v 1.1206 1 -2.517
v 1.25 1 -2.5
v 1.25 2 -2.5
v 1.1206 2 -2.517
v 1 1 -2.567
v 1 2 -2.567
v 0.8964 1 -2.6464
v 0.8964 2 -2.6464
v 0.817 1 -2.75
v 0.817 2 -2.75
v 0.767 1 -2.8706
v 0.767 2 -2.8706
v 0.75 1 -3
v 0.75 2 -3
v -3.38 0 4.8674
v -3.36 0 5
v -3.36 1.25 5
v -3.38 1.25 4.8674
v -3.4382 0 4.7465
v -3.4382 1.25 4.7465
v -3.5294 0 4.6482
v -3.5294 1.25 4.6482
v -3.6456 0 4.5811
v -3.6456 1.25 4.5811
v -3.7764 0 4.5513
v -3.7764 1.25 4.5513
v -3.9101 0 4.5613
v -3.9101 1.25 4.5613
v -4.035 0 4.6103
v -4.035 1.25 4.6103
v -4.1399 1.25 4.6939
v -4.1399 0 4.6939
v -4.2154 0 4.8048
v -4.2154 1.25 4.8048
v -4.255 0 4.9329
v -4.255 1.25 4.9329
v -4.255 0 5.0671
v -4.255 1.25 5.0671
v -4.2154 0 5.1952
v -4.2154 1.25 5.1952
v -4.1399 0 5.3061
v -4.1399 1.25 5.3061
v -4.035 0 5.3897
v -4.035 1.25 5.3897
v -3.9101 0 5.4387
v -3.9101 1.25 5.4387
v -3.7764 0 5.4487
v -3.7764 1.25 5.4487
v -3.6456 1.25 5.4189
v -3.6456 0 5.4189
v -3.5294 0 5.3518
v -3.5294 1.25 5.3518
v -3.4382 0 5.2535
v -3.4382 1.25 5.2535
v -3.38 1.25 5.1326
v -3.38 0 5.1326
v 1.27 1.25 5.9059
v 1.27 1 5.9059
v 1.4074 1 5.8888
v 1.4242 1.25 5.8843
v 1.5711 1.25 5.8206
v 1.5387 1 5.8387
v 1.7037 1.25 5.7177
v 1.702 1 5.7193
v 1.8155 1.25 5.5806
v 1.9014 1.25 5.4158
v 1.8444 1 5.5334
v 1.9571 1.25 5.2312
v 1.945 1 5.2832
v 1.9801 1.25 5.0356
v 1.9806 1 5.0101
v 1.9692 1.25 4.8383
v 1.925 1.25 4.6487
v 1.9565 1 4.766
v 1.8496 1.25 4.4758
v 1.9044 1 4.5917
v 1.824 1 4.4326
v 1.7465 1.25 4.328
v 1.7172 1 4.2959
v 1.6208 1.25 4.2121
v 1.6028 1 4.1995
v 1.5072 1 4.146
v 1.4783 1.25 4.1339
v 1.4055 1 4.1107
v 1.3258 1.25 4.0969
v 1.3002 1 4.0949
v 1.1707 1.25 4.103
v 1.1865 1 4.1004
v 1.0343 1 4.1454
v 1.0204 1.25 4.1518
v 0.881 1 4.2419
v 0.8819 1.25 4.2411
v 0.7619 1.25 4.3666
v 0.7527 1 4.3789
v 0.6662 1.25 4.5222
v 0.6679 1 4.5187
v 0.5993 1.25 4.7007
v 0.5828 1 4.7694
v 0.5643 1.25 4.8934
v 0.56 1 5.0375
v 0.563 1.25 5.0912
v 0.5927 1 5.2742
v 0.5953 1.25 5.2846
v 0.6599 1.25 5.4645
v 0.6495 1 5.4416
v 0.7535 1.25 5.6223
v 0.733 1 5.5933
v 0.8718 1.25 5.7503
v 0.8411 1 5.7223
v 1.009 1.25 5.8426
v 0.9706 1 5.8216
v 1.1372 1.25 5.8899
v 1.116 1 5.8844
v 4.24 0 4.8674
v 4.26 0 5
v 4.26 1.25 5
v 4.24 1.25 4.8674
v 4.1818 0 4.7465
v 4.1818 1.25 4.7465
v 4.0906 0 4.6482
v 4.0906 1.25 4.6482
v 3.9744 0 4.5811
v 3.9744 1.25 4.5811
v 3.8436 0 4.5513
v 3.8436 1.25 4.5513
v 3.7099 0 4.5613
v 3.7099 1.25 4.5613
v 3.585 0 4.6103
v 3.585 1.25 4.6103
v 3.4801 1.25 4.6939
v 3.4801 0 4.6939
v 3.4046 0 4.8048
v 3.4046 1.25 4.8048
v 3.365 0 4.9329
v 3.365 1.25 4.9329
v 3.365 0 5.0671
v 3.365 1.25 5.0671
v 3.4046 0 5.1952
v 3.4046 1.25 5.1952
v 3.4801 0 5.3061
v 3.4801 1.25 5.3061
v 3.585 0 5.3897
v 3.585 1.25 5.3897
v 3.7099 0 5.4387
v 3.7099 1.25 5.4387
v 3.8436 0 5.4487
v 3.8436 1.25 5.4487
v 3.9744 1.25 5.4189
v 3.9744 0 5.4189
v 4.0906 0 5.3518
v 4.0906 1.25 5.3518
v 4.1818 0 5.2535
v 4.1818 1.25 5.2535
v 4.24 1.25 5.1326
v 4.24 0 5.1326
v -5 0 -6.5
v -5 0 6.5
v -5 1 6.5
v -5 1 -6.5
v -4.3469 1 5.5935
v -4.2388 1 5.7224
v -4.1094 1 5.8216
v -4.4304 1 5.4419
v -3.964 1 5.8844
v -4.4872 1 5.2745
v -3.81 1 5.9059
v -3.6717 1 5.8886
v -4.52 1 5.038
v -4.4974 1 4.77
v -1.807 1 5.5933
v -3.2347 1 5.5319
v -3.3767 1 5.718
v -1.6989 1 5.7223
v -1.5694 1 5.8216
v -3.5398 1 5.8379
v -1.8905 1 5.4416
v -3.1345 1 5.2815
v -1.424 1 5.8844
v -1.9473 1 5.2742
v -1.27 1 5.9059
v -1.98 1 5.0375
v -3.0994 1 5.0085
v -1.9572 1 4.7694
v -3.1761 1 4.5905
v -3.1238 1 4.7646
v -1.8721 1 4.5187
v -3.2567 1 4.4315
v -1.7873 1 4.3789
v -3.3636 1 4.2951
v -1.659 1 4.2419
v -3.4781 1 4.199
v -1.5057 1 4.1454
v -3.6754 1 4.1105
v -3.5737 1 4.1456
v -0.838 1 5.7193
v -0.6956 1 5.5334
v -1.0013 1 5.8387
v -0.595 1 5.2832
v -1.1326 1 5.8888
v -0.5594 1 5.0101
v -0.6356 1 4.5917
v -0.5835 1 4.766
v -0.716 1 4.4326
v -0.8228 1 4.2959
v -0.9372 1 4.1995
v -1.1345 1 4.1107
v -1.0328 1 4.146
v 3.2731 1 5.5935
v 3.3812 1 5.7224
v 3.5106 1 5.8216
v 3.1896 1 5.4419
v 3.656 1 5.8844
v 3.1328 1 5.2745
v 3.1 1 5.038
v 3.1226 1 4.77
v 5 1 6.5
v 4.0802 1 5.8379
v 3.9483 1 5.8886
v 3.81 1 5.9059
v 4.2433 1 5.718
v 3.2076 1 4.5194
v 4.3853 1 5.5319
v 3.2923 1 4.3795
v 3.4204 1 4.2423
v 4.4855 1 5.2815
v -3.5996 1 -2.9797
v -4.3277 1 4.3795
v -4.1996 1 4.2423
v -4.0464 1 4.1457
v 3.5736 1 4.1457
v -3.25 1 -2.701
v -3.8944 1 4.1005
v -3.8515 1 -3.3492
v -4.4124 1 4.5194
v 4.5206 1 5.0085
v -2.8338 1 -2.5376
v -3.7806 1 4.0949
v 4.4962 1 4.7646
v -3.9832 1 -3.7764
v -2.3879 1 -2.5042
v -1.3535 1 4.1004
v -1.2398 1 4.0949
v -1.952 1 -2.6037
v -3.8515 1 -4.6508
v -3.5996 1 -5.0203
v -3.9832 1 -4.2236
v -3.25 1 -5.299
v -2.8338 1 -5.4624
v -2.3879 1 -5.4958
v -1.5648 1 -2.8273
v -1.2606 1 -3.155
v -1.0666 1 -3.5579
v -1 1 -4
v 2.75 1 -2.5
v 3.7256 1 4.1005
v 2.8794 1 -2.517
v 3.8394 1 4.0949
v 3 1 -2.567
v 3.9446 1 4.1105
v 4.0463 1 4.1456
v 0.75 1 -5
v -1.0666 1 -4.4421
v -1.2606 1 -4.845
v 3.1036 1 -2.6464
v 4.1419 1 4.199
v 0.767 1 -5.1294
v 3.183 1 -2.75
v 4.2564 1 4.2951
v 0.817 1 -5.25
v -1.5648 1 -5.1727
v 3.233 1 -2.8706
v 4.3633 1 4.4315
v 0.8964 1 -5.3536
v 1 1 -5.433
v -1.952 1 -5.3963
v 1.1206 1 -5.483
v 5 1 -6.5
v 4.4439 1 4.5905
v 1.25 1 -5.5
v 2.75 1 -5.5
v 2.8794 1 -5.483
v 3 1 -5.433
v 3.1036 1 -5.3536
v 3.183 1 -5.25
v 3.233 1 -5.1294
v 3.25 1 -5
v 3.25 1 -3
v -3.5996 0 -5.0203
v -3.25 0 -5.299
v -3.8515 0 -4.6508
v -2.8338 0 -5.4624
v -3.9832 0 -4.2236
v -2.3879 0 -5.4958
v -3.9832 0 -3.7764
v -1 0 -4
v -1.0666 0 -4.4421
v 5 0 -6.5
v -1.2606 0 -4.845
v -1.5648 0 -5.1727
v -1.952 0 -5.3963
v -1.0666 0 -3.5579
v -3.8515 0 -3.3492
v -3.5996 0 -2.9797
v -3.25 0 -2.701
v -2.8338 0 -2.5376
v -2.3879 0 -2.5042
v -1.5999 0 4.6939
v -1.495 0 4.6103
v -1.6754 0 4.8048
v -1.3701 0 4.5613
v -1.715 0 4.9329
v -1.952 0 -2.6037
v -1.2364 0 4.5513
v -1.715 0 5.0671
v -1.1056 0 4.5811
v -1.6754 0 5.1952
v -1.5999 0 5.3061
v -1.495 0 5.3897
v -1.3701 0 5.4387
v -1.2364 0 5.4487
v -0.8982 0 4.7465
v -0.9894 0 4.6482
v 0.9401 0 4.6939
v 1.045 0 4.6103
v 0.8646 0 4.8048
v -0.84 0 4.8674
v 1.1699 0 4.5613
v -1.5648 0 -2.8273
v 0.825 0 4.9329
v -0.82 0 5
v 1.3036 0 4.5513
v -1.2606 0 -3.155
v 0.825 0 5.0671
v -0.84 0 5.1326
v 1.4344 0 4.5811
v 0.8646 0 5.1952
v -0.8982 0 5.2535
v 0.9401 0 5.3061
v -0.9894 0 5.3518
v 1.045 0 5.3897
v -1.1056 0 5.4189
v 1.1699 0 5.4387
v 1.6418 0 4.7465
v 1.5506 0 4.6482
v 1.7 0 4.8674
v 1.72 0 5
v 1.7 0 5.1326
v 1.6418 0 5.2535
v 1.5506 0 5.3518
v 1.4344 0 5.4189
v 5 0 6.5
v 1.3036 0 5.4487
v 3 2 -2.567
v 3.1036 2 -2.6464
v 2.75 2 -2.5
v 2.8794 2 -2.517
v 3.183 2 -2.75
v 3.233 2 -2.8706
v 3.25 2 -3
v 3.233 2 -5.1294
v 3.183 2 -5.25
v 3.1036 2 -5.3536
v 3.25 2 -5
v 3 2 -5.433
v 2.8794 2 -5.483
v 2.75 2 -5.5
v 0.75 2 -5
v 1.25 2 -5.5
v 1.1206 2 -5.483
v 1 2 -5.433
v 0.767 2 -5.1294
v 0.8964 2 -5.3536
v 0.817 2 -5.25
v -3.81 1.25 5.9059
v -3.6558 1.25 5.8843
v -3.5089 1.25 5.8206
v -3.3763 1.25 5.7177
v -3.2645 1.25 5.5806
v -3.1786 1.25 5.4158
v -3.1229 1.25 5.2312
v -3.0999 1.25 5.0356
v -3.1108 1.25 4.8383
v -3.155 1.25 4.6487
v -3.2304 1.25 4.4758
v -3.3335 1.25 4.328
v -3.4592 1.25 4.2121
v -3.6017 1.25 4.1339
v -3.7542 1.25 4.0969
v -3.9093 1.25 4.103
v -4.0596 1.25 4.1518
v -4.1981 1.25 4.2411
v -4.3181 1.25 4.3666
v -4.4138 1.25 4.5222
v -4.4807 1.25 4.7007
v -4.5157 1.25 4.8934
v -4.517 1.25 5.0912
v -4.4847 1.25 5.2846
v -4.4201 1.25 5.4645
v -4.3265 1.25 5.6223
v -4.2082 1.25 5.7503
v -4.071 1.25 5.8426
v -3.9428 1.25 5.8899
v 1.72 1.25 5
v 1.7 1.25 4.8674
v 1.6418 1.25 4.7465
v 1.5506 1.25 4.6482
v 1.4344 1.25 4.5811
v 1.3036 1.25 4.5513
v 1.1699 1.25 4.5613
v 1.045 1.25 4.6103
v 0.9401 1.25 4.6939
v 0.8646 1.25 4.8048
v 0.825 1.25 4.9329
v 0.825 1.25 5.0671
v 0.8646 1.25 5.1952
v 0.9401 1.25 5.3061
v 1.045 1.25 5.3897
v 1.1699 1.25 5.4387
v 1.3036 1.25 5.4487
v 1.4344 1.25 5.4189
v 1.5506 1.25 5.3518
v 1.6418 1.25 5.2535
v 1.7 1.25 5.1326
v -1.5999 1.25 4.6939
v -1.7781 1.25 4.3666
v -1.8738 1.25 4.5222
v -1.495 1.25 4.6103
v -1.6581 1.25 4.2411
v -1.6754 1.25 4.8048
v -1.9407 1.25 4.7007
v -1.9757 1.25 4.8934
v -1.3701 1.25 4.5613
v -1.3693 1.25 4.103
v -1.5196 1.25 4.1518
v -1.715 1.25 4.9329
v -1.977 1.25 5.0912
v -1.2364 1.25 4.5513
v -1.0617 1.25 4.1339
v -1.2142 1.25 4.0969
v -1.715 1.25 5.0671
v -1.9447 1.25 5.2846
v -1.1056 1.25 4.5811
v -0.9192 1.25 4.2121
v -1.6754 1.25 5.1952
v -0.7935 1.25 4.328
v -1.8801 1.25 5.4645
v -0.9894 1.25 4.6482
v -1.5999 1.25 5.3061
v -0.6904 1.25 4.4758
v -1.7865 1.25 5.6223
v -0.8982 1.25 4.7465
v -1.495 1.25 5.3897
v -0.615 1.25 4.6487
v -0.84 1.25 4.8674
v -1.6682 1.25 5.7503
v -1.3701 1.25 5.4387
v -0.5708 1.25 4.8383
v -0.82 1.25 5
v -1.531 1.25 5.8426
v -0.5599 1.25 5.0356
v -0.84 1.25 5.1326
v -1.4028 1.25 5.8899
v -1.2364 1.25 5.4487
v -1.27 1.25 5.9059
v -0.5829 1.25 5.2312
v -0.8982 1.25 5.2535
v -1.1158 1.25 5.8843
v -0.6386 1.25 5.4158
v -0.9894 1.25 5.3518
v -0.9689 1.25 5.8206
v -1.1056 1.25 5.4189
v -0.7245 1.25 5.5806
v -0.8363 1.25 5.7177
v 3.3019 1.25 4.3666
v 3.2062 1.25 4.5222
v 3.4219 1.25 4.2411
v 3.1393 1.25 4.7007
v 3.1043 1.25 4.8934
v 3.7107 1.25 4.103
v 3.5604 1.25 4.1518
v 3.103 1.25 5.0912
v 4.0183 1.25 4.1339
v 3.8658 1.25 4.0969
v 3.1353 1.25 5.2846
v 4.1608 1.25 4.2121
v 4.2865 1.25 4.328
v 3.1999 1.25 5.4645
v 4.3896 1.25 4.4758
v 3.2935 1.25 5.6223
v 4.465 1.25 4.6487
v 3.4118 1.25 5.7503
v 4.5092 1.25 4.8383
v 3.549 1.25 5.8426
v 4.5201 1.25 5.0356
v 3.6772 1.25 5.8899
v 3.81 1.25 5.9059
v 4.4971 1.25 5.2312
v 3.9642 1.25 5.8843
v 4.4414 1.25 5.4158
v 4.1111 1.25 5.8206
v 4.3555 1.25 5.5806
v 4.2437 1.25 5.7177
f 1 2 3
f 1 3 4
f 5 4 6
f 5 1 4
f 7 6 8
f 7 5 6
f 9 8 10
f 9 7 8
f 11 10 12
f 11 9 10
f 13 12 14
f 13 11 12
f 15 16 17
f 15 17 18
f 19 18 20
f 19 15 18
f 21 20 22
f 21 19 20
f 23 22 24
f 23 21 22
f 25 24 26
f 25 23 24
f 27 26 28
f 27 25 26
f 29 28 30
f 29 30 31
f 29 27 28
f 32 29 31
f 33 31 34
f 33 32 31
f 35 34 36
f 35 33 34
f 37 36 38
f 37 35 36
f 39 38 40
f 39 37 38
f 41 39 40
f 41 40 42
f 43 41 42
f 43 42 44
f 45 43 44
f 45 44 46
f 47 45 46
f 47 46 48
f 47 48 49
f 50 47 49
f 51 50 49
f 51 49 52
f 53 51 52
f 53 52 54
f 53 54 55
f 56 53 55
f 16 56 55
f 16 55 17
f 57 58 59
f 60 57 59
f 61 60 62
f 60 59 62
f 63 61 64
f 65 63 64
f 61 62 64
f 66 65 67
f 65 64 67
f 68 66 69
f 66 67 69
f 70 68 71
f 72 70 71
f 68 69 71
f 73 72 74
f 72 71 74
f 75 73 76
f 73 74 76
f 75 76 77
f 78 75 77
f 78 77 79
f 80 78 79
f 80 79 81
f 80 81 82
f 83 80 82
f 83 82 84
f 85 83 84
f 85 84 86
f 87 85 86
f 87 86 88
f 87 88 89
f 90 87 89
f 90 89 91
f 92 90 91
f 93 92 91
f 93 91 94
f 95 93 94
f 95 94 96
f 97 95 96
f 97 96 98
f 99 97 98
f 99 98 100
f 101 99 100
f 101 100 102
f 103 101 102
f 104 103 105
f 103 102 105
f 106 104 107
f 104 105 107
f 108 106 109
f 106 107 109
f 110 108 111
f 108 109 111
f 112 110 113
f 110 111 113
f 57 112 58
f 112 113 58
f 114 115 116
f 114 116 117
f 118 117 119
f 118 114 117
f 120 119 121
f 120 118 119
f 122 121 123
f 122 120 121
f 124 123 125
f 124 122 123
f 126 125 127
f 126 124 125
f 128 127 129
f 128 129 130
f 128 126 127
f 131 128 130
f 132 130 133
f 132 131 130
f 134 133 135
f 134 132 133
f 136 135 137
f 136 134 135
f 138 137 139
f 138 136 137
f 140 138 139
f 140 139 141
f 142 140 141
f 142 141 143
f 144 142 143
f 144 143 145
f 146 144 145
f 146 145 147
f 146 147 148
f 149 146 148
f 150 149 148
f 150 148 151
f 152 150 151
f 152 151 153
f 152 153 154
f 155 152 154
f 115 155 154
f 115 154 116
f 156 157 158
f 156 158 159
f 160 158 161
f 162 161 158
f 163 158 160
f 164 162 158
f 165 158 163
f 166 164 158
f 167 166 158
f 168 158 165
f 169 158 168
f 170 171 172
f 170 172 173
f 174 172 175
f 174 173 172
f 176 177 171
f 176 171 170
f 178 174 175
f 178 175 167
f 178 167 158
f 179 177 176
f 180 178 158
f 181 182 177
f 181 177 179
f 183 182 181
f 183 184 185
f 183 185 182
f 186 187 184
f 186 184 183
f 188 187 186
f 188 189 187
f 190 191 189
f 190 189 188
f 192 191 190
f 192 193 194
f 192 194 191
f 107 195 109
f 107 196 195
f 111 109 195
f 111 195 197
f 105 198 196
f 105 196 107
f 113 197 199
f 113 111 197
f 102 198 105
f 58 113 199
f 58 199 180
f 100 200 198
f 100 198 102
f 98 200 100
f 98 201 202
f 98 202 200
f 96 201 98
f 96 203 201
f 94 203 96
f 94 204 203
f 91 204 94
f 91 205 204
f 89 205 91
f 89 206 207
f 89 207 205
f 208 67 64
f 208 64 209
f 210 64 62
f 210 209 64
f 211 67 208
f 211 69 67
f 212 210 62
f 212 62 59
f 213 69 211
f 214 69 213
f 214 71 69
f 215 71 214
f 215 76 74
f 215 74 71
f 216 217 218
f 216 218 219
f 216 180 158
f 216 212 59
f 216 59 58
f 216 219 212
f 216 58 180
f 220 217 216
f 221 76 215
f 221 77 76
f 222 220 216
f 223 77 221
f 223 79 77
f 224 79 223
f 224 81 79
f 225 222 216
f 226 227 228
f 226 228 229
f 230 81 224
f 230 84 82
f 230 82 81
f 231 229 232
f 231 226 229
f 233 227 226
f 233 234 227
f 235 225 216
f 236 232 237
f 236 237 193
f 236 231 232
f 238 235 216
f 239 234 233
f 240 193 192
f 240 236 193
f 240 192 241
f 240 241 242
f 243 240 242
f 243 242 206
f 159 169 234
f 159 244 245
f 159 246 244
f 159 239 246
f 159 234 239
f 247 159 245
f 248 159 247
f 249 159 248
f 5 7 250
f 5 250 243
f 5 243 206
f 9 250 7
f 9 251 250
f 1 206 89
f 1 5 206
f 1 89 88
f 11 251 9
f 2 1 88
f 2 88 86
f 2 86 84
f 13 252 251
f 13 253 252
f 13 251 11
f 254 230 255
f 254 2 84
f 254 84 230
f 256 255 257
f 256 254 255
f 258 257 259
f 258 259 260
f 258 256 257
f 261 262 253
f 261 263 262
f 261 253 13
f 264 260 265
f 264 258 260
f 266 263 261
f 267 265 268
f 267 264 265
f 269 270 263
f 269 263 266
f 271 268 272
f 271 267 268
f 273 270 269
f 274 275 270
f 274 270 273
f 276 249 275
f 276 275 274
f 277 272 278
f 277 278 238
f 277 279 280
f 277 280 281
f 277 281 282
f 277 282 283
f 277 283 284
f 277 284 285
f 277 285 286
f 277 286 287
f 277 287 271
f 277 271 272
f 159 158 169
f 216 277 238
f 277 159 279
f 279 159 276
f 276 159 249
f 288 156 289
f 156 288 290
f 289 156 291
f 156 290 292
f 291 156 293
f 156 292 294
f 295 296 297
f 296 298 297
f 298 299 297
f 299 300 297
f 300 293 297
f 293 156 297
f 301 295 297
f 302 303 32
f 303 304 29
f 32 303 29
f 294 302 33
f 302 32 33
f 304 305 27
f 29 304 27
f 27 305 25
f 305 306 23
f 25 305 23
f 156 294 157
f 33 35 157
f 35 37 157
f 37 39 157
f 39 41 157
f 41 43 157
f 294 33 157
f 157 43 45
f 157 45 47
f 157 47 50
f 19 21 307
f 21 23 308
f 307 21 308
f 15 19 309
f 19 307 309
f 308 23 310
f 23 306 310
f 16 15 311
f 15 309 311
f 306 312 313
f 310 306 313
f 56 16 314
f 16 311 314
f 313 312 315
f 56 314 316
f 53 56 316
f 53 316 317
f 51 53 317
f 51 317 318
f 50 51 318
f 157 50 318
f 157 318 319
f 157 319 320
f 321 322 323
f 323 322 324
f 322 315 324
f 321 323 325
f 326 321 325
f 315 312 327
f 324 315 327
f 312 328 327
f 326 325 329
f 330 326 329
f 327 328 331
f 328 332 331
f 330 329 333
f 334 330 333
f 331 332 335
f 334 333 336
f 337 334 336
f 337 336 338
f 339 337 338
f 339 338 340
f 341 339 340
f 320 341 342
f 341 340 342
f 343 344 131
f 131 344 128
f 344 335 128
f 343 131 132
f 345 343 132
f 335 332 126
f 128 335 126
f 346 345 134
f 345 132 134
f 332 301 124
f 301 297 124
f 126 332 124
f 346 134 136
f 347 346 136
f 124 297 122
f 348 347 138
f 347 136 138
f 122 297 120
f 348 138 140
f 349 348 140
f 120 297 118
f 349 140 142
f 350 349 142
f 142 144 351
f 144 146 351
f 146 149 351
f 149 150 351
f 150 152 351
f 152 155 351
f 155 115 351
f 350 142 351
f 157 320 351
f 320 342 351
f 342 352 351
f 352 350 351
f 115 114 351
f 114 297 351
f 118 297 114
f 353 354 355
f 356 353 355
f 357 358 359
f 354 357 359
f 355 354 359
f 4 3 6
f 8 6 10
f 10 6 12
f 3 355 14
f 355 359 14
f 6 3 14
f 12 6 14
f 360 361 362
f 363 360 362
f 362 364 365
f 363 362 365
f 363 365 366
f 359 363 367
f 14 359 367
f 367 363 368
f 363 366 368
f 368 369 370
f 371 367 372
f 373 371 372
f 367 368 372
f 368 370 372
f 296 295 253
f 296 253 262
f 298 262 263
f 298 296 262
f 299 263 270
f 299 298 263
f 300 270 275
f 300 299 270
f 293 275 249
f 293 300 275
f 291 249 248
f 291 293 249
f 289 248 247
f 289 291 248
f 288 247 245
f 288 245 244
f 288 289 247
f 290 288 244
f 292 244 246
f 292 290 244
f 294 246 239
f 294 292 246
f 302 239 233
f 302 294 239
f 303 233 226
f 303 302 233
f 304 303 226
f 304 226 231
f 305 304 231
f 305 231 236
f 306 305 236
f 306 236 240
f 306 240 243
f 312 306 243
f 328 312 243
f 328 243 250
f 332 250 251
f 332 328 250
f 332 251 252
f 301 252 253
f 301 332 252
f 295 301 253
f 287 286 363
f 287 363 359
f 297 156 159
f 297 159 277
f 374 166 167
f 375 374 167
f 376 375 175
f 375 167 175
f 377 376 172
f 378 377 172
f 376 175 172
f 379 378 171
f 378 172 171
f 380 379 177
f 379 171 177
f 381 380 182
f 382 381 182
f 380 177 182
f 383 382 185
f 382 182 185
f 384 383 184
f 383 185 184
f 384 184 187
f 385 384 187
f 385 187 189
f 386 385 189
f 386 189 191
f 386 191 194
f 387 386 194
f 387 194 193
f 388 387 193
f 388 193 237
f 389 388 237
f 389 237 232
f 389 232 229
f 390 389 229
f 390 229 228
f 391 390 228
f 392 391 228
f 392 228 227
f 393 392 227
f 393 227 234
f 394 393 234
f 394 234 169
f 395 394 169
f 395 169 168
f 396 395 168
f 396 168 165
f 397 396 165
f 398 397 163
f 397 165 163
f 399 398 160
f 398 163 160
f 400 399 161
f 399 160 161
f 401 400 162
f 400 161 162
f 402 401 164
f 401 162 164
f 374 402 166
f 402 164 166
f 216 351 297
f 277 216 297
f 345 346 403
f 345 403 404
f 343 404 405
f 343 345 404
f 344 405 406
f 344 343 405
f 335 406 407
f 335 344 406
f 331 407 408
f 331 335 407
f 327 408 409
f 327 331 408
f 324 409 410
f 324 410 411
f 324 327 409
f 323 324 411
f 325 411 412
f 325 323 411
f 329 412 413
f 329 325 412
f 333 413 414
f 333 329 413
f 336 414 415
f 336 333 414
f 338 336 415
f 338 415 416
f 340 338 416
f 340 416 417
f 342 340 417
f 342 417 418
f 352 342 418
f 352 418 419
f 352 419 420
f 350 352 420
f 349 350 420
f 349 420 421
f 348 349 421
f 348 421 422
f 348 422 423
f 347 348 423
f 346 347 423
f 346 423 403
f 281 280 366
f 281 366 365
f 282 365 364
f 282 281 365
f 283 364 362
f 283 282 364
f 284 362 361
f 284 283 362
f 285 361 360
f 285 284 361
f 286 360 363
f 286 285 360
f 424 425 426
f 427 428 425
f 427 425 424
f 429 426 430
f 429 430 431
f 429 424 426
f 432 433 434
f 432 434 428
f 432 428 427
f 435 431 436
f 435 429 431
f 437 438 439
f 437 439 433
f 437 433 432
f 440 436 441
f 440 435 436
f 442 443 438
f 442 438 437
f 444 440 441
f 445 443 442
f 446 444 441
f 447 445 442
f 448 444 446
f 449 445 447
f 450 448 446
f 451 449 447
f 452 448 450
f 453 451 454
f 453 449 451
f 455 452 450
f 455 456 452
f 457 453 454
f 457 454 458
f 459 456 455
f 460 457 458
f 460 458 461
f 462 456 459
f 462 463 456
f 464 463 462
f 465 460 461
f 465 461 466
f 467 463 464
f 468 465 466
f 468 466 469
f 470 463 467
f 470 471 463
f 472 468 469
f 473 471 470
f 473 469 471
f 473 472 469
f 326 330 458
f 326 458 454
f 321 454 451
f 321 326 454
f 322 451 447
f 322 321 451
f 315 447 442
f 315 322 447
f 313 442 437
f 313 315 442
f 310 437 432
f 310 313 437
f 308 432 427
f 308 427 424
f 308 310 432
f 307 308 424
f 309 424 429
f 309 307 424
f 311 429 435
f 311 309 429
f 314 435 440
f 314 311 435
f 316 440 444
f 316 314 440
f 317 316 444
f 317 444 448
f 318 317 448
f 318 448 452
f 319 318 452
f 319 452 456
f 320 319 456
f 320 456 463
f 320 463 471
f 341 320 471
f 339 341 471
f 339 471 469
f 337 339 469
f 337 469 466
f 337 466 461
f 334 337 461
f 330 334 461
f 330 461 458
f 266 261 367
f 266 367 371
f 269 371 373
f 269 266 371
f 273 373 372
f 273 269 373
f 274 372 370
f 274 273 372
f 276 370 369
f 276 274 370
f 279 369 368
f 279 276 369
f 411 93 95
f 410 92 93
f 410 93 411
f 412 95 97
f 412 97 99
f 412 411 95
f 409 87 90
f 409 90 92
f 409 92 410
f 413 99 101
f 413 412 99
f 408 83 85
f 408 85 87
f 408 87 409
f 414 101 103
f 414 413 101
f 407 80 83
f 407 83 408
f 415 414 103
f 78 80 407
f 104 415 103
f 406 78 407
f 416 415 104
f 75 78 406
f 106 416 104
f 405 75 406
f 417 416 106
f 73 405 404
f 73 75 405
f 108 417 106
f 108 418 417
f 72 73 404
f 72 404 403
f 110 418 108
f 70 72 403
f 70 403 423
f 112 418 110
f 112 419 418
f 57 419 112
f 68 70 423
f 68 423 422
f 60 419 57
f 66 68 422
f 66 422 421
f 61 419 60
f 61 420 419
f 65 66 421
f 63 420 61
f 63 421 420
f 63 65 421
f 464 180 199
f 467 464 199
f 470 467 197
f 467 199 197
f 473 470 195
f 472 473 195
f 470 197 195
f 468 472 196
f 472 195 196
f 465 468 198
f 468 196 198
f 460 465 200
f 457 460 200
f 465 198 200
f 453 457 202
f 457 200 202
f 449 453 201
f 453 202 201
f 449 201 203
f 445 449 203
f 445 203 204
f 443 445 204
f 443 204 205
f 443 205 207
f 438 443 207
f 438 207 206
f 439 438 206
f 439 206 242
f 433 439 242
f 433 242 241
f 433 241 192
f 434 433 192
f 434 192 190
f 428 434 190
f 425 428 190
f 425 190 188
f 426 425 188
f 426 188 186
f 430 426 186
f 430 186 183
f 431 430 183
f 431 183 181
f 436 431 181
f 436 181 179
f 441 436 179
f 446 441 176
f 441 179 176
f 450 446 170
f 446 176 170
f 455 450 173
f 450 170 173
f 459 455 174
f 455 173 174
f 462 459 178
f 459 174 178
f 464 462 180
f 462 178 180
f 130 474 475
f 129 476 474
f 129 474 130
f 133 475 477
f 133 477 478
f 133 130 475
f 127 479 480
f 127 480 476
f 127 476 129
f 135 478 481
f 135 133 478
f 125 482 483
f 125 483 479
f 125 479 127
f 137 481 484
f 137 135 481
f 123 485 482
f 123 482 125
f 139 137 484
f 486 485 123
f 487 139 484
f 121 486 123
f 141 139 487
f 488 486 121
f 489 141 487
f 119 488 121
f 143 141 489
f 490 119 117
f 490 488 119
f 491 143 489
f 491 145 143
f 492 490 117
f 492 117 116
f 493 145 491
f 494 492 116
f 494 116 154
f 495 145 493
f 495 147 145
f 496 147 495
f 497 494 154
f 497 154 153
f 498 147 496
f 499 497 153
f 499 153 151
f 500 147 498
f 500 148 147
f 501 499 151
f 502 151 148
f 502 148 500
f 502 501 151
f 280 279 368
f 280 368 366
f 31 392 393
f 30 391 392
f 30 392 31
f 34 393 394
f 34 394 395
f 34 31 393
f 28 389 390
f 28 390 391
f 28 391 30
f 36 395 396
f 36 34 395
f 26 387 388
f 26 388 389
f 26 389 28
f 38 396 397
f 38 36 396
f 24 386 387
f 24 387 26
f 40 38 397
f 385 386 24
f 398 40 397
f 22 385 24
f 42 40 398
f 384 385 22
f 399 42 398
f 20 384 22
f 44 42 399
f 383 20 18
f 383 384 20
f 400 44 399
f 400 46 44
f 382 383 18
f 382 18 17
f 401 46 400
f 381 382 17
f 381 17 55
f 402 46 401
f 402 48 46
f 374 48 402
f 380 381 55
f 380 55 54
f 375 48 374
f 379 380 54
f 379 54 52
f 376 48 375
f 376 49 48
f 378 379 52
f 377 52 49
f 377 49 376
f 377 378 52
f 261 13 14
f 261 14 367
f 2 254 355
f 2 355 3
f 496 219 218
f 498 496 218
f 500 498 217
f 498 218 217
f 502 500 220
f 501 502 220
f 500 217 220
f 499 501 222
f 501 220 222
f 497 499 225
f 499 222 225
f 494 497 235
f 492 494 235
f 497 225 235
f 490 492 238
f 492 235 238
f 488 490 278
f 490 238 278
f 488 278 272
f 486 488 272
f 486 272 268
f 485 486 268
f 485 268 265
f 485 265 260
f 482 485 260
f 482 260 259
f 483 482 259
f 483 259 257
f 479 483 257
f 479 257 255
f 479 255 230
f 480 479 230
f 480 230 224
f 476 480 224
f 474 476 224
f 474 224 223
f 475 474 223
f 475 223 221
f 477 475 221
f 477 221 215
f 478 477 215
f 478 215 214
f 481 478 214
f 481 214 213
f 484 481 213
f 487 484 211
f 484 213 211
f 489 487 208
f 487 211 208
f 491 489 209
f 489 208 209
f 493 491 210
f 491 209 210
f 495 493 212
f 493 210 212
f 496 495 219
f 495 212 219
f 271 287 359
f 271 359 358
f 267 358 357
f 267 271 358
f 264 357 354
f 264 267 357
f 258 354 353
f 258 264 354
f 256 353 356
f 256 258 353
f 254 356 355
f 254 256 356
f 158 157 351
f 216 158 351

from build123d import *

# Parameters (mm, degrees)
SKETCH1_W               = 10
SKETCH1_H               = 13
SKETCH1_R               = 1.5
BOSS_EXTRUDE1_DEPTH     = 1
BOSS_EXTRUDE2_DEPTH     = 2
SKETCH3_RX              = 0.905906642
SKETCH3_RY              = 0.710654866
SKETCH3_R               = 0.45
BOSS_EXTRUDE3_DEPTH     = 1.25
SKETCH4_R               = 0.45
CUT_EXTRUDE1_DEPTH      = 3
CUT_EXTRUDE1_DEPTH_BACK = 2


with BuildPart() as part:
    # Sketch1 → Boss-Extrude1 (new body)
    with BuildSketch(Plane(origin=(0, 0, 0), x_dir=(1, 0, 0), z_dir=(0, 1, 0))):
        Rectangle(SKETCH1_W, SKETCH1_H)
        with Locations((-2.5, 4)):
            Circle(SKETCH1_R, mode=Mode.SUBTRACT)
    extrude(amount=BOSS_EXTRUDE1_DEPTH)

    # Sketch2 → Boss-Extrude2 (add)
    with BuildSketch(Plane(origin=(0, 0, 0), x_dir=(1, 0, 0), z_dir=(0, 1, 0))):
        with BuildLine():
            Line((1.25, 5.5), (2.75, 5.5))
            ThreePointArc((2.75, 5.5), (3.103553391, 5.353553391), (3.25, 5))
            Line((3.25, 5), (3.25, 3))
            ThreePointArc((3.25, 3), (3.103553391, 2.646446609), (2.75, 2.5))
            Line((2.75, 2.5), (1.25, 2.5))
            ThreePointArc((1.25, 2.5), (0.896446609, 2.646446609), (0.75, 3))
            Line((0.75, 3), (0.75, 5))
            ThreePointArc((0.75, 5), (0.896446609, 5.353553391), (1.25, 5.5))
        make_face()
    extrude(amount=BOSS_EXTRUDE2_DEPTH)

    # Sketch3 → Boss-Extrude3 (add)
    with BuildSketch(Plane(origin=(0, 0, 0), x_dir=(1, 0, 0), z_dir=(0, 1, 0))):
        with Locations(Location((-1.27, -5), (0, 0, -90))):
            Ellipse(SKETCH3_RX, SKETCH3_RY)
        with Locations((-1.27, -5)):
            Circle(SKETCH3_R, mode=Mode.SUBTRACT)
        with Locations(Location((-3.81, -5), (0, 0, -90))):
            Ellipse(SKETCH3_RX, SKETCH3_RY)
        with Locations((-3.81, -5)):
            Circle(SKETCH3_R, mode=Mode.SUBTRACT)
        with Locations(Location((3.81, -5), (0, 0, -90))):
            Ellipse(SKETCH3_RX, SKETCH3_RY)
        with Locations((3.81, -5)):
            Circle(SKETCH3_R, mode=Mode.SUBTRACT)
        with Locations(Location((1.27, -5), (0, 0, -90))):
            Ellipse(SKETCH3_RX, SKETCH3_RY)
        with Locations((1.27, -5)):
            Circle(SKETCH3_R, mode=Mode.SUBTRACT)
    extrude(amount=BOSS_EXTRUDE3_DEPTH)

    # Sketch4 → Cut-Extrude1 (cut, two sides)
    with BuildSketch(Plane(origin=(0, 0, 0), x_dir=(1, 0, 0), z_dir=(0, 1, 0))) as cut_extrude1_sk:
        with Locations((-3.81, -5)):
            Circle(SKETCH4_R)
        with Locations((-1.27, -5)):
            Circle(SKETCH4_R)
        with Locations((1.27, -5)):
            Circle(SKETCH4_R)
        with Locations((3.81, -5)):
            Circle(SKETCH4_R)
    extrude(amount=CUT_EXTRUDE1_DEPTH, mode=Mode.SUBTRACT)
    extrude(cut_extrude1_sk.sketch, amount=-CUT_EXTRUDE1_DEPTH_BACK, mode=Mode.SUBTRACT)


solid = part.part
